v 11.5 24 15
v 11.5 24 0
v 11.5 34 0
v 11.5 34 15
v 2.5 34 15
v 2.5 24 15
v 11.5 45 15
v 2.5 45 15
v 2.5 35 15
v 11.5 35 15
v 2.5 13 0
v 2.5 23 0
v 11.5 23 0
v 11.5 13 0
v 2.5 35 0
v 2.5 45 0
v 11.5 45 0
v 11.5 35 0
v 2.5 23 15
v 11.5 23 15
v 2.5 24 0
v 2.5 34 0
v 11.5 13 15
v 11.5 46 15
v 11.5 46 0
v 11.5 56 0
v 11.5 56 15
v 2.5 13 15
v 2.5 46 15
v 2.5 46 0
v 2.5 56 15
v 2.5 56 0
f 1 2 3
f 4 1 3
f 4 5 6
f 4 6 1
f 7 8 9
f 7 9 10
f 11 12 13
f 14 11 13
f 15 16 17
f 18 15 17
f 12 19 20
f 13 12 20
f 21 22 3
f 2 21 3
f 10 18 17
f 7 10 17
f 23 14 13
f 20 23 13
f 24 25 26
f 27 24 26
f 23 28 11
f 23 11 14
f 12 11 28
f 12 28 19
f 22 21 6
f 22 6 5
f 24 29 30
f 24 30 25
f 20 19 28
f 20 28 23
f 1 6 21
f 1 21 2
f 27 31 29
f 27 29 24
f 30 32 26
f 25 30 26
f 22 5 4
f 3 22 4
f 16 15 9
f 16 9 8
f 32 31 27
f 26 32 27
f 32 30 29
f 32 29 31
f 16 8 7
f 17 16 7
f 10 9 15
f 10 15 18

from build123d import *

# Parameters (mm, degrees)
BOX089_W     = 9
BOX089_H     = 10
BOX089_DEPTH = 15
BOX090_W     = 9
BOX090_H     = 10
BOX090_DEPTH = 15
BOX091_W     = 9
BOX091_H     = 10
BOX091_DEPTH = 15
BOX088_W     = 9
BOX088_H     = 10
BOX088_DEPTH = 15


with BuildPart() as cube059:
    # Box089 → Box089 (new body)
    with BuildSketch(Plane(origin=(2.5, 24, 0), x_dir=(1, 0, 0), z_dir=(0, 0, 1))):
        with Locations((4.5, 5)):
            Rectangle(BOX089_W, BOX089_H)
    extrude(amount=BOX089_DEPTH)


with BuildPart() as cube060:
    # Box090 → Box090 (new body)
    with BuildSketch(Plane(origin=(2.5, 35, 0), x_dir=(1, 0, 0), z_dir=(0, 0, 1))):
        with Locations((4.5, 5)):
            Rectangle(BOX090_W, BOX090_H)
    extrude(amount=BOX090_DEPTH)


with BuildPart() as cube061:
    # Box091 → Box091 (new body)
    with BuildSketch(Plane(origin=(2.5, 46, 0), x_dir=(1, 0, 0), z_dir=(0, 0, 1))):
        with Locations((4.5, 5)):
            Rectangle(BOX091_W, BOX091_H)
    extrude(amount=BOX091_DEPTH)


with BuildPart() as inputs001:
    # Box088 → Box088 (new body)
    with BuildSketch(Plane(origin=(2.5, 13, 0), x_dir=(1, 0, 0), z_dir=(0, 0, 1))):
        with Locations((4.5, 5)):
            Rectangle(BOX088_W, BOX088_H)
    extrude(amount=BOX088_DEPTH)

    # Fusion068: union Cube059, Cube060, Cube061
    add(cube059.part)
    add(cube060.part)
    add(cube061.part)


solid = inputs001.part
